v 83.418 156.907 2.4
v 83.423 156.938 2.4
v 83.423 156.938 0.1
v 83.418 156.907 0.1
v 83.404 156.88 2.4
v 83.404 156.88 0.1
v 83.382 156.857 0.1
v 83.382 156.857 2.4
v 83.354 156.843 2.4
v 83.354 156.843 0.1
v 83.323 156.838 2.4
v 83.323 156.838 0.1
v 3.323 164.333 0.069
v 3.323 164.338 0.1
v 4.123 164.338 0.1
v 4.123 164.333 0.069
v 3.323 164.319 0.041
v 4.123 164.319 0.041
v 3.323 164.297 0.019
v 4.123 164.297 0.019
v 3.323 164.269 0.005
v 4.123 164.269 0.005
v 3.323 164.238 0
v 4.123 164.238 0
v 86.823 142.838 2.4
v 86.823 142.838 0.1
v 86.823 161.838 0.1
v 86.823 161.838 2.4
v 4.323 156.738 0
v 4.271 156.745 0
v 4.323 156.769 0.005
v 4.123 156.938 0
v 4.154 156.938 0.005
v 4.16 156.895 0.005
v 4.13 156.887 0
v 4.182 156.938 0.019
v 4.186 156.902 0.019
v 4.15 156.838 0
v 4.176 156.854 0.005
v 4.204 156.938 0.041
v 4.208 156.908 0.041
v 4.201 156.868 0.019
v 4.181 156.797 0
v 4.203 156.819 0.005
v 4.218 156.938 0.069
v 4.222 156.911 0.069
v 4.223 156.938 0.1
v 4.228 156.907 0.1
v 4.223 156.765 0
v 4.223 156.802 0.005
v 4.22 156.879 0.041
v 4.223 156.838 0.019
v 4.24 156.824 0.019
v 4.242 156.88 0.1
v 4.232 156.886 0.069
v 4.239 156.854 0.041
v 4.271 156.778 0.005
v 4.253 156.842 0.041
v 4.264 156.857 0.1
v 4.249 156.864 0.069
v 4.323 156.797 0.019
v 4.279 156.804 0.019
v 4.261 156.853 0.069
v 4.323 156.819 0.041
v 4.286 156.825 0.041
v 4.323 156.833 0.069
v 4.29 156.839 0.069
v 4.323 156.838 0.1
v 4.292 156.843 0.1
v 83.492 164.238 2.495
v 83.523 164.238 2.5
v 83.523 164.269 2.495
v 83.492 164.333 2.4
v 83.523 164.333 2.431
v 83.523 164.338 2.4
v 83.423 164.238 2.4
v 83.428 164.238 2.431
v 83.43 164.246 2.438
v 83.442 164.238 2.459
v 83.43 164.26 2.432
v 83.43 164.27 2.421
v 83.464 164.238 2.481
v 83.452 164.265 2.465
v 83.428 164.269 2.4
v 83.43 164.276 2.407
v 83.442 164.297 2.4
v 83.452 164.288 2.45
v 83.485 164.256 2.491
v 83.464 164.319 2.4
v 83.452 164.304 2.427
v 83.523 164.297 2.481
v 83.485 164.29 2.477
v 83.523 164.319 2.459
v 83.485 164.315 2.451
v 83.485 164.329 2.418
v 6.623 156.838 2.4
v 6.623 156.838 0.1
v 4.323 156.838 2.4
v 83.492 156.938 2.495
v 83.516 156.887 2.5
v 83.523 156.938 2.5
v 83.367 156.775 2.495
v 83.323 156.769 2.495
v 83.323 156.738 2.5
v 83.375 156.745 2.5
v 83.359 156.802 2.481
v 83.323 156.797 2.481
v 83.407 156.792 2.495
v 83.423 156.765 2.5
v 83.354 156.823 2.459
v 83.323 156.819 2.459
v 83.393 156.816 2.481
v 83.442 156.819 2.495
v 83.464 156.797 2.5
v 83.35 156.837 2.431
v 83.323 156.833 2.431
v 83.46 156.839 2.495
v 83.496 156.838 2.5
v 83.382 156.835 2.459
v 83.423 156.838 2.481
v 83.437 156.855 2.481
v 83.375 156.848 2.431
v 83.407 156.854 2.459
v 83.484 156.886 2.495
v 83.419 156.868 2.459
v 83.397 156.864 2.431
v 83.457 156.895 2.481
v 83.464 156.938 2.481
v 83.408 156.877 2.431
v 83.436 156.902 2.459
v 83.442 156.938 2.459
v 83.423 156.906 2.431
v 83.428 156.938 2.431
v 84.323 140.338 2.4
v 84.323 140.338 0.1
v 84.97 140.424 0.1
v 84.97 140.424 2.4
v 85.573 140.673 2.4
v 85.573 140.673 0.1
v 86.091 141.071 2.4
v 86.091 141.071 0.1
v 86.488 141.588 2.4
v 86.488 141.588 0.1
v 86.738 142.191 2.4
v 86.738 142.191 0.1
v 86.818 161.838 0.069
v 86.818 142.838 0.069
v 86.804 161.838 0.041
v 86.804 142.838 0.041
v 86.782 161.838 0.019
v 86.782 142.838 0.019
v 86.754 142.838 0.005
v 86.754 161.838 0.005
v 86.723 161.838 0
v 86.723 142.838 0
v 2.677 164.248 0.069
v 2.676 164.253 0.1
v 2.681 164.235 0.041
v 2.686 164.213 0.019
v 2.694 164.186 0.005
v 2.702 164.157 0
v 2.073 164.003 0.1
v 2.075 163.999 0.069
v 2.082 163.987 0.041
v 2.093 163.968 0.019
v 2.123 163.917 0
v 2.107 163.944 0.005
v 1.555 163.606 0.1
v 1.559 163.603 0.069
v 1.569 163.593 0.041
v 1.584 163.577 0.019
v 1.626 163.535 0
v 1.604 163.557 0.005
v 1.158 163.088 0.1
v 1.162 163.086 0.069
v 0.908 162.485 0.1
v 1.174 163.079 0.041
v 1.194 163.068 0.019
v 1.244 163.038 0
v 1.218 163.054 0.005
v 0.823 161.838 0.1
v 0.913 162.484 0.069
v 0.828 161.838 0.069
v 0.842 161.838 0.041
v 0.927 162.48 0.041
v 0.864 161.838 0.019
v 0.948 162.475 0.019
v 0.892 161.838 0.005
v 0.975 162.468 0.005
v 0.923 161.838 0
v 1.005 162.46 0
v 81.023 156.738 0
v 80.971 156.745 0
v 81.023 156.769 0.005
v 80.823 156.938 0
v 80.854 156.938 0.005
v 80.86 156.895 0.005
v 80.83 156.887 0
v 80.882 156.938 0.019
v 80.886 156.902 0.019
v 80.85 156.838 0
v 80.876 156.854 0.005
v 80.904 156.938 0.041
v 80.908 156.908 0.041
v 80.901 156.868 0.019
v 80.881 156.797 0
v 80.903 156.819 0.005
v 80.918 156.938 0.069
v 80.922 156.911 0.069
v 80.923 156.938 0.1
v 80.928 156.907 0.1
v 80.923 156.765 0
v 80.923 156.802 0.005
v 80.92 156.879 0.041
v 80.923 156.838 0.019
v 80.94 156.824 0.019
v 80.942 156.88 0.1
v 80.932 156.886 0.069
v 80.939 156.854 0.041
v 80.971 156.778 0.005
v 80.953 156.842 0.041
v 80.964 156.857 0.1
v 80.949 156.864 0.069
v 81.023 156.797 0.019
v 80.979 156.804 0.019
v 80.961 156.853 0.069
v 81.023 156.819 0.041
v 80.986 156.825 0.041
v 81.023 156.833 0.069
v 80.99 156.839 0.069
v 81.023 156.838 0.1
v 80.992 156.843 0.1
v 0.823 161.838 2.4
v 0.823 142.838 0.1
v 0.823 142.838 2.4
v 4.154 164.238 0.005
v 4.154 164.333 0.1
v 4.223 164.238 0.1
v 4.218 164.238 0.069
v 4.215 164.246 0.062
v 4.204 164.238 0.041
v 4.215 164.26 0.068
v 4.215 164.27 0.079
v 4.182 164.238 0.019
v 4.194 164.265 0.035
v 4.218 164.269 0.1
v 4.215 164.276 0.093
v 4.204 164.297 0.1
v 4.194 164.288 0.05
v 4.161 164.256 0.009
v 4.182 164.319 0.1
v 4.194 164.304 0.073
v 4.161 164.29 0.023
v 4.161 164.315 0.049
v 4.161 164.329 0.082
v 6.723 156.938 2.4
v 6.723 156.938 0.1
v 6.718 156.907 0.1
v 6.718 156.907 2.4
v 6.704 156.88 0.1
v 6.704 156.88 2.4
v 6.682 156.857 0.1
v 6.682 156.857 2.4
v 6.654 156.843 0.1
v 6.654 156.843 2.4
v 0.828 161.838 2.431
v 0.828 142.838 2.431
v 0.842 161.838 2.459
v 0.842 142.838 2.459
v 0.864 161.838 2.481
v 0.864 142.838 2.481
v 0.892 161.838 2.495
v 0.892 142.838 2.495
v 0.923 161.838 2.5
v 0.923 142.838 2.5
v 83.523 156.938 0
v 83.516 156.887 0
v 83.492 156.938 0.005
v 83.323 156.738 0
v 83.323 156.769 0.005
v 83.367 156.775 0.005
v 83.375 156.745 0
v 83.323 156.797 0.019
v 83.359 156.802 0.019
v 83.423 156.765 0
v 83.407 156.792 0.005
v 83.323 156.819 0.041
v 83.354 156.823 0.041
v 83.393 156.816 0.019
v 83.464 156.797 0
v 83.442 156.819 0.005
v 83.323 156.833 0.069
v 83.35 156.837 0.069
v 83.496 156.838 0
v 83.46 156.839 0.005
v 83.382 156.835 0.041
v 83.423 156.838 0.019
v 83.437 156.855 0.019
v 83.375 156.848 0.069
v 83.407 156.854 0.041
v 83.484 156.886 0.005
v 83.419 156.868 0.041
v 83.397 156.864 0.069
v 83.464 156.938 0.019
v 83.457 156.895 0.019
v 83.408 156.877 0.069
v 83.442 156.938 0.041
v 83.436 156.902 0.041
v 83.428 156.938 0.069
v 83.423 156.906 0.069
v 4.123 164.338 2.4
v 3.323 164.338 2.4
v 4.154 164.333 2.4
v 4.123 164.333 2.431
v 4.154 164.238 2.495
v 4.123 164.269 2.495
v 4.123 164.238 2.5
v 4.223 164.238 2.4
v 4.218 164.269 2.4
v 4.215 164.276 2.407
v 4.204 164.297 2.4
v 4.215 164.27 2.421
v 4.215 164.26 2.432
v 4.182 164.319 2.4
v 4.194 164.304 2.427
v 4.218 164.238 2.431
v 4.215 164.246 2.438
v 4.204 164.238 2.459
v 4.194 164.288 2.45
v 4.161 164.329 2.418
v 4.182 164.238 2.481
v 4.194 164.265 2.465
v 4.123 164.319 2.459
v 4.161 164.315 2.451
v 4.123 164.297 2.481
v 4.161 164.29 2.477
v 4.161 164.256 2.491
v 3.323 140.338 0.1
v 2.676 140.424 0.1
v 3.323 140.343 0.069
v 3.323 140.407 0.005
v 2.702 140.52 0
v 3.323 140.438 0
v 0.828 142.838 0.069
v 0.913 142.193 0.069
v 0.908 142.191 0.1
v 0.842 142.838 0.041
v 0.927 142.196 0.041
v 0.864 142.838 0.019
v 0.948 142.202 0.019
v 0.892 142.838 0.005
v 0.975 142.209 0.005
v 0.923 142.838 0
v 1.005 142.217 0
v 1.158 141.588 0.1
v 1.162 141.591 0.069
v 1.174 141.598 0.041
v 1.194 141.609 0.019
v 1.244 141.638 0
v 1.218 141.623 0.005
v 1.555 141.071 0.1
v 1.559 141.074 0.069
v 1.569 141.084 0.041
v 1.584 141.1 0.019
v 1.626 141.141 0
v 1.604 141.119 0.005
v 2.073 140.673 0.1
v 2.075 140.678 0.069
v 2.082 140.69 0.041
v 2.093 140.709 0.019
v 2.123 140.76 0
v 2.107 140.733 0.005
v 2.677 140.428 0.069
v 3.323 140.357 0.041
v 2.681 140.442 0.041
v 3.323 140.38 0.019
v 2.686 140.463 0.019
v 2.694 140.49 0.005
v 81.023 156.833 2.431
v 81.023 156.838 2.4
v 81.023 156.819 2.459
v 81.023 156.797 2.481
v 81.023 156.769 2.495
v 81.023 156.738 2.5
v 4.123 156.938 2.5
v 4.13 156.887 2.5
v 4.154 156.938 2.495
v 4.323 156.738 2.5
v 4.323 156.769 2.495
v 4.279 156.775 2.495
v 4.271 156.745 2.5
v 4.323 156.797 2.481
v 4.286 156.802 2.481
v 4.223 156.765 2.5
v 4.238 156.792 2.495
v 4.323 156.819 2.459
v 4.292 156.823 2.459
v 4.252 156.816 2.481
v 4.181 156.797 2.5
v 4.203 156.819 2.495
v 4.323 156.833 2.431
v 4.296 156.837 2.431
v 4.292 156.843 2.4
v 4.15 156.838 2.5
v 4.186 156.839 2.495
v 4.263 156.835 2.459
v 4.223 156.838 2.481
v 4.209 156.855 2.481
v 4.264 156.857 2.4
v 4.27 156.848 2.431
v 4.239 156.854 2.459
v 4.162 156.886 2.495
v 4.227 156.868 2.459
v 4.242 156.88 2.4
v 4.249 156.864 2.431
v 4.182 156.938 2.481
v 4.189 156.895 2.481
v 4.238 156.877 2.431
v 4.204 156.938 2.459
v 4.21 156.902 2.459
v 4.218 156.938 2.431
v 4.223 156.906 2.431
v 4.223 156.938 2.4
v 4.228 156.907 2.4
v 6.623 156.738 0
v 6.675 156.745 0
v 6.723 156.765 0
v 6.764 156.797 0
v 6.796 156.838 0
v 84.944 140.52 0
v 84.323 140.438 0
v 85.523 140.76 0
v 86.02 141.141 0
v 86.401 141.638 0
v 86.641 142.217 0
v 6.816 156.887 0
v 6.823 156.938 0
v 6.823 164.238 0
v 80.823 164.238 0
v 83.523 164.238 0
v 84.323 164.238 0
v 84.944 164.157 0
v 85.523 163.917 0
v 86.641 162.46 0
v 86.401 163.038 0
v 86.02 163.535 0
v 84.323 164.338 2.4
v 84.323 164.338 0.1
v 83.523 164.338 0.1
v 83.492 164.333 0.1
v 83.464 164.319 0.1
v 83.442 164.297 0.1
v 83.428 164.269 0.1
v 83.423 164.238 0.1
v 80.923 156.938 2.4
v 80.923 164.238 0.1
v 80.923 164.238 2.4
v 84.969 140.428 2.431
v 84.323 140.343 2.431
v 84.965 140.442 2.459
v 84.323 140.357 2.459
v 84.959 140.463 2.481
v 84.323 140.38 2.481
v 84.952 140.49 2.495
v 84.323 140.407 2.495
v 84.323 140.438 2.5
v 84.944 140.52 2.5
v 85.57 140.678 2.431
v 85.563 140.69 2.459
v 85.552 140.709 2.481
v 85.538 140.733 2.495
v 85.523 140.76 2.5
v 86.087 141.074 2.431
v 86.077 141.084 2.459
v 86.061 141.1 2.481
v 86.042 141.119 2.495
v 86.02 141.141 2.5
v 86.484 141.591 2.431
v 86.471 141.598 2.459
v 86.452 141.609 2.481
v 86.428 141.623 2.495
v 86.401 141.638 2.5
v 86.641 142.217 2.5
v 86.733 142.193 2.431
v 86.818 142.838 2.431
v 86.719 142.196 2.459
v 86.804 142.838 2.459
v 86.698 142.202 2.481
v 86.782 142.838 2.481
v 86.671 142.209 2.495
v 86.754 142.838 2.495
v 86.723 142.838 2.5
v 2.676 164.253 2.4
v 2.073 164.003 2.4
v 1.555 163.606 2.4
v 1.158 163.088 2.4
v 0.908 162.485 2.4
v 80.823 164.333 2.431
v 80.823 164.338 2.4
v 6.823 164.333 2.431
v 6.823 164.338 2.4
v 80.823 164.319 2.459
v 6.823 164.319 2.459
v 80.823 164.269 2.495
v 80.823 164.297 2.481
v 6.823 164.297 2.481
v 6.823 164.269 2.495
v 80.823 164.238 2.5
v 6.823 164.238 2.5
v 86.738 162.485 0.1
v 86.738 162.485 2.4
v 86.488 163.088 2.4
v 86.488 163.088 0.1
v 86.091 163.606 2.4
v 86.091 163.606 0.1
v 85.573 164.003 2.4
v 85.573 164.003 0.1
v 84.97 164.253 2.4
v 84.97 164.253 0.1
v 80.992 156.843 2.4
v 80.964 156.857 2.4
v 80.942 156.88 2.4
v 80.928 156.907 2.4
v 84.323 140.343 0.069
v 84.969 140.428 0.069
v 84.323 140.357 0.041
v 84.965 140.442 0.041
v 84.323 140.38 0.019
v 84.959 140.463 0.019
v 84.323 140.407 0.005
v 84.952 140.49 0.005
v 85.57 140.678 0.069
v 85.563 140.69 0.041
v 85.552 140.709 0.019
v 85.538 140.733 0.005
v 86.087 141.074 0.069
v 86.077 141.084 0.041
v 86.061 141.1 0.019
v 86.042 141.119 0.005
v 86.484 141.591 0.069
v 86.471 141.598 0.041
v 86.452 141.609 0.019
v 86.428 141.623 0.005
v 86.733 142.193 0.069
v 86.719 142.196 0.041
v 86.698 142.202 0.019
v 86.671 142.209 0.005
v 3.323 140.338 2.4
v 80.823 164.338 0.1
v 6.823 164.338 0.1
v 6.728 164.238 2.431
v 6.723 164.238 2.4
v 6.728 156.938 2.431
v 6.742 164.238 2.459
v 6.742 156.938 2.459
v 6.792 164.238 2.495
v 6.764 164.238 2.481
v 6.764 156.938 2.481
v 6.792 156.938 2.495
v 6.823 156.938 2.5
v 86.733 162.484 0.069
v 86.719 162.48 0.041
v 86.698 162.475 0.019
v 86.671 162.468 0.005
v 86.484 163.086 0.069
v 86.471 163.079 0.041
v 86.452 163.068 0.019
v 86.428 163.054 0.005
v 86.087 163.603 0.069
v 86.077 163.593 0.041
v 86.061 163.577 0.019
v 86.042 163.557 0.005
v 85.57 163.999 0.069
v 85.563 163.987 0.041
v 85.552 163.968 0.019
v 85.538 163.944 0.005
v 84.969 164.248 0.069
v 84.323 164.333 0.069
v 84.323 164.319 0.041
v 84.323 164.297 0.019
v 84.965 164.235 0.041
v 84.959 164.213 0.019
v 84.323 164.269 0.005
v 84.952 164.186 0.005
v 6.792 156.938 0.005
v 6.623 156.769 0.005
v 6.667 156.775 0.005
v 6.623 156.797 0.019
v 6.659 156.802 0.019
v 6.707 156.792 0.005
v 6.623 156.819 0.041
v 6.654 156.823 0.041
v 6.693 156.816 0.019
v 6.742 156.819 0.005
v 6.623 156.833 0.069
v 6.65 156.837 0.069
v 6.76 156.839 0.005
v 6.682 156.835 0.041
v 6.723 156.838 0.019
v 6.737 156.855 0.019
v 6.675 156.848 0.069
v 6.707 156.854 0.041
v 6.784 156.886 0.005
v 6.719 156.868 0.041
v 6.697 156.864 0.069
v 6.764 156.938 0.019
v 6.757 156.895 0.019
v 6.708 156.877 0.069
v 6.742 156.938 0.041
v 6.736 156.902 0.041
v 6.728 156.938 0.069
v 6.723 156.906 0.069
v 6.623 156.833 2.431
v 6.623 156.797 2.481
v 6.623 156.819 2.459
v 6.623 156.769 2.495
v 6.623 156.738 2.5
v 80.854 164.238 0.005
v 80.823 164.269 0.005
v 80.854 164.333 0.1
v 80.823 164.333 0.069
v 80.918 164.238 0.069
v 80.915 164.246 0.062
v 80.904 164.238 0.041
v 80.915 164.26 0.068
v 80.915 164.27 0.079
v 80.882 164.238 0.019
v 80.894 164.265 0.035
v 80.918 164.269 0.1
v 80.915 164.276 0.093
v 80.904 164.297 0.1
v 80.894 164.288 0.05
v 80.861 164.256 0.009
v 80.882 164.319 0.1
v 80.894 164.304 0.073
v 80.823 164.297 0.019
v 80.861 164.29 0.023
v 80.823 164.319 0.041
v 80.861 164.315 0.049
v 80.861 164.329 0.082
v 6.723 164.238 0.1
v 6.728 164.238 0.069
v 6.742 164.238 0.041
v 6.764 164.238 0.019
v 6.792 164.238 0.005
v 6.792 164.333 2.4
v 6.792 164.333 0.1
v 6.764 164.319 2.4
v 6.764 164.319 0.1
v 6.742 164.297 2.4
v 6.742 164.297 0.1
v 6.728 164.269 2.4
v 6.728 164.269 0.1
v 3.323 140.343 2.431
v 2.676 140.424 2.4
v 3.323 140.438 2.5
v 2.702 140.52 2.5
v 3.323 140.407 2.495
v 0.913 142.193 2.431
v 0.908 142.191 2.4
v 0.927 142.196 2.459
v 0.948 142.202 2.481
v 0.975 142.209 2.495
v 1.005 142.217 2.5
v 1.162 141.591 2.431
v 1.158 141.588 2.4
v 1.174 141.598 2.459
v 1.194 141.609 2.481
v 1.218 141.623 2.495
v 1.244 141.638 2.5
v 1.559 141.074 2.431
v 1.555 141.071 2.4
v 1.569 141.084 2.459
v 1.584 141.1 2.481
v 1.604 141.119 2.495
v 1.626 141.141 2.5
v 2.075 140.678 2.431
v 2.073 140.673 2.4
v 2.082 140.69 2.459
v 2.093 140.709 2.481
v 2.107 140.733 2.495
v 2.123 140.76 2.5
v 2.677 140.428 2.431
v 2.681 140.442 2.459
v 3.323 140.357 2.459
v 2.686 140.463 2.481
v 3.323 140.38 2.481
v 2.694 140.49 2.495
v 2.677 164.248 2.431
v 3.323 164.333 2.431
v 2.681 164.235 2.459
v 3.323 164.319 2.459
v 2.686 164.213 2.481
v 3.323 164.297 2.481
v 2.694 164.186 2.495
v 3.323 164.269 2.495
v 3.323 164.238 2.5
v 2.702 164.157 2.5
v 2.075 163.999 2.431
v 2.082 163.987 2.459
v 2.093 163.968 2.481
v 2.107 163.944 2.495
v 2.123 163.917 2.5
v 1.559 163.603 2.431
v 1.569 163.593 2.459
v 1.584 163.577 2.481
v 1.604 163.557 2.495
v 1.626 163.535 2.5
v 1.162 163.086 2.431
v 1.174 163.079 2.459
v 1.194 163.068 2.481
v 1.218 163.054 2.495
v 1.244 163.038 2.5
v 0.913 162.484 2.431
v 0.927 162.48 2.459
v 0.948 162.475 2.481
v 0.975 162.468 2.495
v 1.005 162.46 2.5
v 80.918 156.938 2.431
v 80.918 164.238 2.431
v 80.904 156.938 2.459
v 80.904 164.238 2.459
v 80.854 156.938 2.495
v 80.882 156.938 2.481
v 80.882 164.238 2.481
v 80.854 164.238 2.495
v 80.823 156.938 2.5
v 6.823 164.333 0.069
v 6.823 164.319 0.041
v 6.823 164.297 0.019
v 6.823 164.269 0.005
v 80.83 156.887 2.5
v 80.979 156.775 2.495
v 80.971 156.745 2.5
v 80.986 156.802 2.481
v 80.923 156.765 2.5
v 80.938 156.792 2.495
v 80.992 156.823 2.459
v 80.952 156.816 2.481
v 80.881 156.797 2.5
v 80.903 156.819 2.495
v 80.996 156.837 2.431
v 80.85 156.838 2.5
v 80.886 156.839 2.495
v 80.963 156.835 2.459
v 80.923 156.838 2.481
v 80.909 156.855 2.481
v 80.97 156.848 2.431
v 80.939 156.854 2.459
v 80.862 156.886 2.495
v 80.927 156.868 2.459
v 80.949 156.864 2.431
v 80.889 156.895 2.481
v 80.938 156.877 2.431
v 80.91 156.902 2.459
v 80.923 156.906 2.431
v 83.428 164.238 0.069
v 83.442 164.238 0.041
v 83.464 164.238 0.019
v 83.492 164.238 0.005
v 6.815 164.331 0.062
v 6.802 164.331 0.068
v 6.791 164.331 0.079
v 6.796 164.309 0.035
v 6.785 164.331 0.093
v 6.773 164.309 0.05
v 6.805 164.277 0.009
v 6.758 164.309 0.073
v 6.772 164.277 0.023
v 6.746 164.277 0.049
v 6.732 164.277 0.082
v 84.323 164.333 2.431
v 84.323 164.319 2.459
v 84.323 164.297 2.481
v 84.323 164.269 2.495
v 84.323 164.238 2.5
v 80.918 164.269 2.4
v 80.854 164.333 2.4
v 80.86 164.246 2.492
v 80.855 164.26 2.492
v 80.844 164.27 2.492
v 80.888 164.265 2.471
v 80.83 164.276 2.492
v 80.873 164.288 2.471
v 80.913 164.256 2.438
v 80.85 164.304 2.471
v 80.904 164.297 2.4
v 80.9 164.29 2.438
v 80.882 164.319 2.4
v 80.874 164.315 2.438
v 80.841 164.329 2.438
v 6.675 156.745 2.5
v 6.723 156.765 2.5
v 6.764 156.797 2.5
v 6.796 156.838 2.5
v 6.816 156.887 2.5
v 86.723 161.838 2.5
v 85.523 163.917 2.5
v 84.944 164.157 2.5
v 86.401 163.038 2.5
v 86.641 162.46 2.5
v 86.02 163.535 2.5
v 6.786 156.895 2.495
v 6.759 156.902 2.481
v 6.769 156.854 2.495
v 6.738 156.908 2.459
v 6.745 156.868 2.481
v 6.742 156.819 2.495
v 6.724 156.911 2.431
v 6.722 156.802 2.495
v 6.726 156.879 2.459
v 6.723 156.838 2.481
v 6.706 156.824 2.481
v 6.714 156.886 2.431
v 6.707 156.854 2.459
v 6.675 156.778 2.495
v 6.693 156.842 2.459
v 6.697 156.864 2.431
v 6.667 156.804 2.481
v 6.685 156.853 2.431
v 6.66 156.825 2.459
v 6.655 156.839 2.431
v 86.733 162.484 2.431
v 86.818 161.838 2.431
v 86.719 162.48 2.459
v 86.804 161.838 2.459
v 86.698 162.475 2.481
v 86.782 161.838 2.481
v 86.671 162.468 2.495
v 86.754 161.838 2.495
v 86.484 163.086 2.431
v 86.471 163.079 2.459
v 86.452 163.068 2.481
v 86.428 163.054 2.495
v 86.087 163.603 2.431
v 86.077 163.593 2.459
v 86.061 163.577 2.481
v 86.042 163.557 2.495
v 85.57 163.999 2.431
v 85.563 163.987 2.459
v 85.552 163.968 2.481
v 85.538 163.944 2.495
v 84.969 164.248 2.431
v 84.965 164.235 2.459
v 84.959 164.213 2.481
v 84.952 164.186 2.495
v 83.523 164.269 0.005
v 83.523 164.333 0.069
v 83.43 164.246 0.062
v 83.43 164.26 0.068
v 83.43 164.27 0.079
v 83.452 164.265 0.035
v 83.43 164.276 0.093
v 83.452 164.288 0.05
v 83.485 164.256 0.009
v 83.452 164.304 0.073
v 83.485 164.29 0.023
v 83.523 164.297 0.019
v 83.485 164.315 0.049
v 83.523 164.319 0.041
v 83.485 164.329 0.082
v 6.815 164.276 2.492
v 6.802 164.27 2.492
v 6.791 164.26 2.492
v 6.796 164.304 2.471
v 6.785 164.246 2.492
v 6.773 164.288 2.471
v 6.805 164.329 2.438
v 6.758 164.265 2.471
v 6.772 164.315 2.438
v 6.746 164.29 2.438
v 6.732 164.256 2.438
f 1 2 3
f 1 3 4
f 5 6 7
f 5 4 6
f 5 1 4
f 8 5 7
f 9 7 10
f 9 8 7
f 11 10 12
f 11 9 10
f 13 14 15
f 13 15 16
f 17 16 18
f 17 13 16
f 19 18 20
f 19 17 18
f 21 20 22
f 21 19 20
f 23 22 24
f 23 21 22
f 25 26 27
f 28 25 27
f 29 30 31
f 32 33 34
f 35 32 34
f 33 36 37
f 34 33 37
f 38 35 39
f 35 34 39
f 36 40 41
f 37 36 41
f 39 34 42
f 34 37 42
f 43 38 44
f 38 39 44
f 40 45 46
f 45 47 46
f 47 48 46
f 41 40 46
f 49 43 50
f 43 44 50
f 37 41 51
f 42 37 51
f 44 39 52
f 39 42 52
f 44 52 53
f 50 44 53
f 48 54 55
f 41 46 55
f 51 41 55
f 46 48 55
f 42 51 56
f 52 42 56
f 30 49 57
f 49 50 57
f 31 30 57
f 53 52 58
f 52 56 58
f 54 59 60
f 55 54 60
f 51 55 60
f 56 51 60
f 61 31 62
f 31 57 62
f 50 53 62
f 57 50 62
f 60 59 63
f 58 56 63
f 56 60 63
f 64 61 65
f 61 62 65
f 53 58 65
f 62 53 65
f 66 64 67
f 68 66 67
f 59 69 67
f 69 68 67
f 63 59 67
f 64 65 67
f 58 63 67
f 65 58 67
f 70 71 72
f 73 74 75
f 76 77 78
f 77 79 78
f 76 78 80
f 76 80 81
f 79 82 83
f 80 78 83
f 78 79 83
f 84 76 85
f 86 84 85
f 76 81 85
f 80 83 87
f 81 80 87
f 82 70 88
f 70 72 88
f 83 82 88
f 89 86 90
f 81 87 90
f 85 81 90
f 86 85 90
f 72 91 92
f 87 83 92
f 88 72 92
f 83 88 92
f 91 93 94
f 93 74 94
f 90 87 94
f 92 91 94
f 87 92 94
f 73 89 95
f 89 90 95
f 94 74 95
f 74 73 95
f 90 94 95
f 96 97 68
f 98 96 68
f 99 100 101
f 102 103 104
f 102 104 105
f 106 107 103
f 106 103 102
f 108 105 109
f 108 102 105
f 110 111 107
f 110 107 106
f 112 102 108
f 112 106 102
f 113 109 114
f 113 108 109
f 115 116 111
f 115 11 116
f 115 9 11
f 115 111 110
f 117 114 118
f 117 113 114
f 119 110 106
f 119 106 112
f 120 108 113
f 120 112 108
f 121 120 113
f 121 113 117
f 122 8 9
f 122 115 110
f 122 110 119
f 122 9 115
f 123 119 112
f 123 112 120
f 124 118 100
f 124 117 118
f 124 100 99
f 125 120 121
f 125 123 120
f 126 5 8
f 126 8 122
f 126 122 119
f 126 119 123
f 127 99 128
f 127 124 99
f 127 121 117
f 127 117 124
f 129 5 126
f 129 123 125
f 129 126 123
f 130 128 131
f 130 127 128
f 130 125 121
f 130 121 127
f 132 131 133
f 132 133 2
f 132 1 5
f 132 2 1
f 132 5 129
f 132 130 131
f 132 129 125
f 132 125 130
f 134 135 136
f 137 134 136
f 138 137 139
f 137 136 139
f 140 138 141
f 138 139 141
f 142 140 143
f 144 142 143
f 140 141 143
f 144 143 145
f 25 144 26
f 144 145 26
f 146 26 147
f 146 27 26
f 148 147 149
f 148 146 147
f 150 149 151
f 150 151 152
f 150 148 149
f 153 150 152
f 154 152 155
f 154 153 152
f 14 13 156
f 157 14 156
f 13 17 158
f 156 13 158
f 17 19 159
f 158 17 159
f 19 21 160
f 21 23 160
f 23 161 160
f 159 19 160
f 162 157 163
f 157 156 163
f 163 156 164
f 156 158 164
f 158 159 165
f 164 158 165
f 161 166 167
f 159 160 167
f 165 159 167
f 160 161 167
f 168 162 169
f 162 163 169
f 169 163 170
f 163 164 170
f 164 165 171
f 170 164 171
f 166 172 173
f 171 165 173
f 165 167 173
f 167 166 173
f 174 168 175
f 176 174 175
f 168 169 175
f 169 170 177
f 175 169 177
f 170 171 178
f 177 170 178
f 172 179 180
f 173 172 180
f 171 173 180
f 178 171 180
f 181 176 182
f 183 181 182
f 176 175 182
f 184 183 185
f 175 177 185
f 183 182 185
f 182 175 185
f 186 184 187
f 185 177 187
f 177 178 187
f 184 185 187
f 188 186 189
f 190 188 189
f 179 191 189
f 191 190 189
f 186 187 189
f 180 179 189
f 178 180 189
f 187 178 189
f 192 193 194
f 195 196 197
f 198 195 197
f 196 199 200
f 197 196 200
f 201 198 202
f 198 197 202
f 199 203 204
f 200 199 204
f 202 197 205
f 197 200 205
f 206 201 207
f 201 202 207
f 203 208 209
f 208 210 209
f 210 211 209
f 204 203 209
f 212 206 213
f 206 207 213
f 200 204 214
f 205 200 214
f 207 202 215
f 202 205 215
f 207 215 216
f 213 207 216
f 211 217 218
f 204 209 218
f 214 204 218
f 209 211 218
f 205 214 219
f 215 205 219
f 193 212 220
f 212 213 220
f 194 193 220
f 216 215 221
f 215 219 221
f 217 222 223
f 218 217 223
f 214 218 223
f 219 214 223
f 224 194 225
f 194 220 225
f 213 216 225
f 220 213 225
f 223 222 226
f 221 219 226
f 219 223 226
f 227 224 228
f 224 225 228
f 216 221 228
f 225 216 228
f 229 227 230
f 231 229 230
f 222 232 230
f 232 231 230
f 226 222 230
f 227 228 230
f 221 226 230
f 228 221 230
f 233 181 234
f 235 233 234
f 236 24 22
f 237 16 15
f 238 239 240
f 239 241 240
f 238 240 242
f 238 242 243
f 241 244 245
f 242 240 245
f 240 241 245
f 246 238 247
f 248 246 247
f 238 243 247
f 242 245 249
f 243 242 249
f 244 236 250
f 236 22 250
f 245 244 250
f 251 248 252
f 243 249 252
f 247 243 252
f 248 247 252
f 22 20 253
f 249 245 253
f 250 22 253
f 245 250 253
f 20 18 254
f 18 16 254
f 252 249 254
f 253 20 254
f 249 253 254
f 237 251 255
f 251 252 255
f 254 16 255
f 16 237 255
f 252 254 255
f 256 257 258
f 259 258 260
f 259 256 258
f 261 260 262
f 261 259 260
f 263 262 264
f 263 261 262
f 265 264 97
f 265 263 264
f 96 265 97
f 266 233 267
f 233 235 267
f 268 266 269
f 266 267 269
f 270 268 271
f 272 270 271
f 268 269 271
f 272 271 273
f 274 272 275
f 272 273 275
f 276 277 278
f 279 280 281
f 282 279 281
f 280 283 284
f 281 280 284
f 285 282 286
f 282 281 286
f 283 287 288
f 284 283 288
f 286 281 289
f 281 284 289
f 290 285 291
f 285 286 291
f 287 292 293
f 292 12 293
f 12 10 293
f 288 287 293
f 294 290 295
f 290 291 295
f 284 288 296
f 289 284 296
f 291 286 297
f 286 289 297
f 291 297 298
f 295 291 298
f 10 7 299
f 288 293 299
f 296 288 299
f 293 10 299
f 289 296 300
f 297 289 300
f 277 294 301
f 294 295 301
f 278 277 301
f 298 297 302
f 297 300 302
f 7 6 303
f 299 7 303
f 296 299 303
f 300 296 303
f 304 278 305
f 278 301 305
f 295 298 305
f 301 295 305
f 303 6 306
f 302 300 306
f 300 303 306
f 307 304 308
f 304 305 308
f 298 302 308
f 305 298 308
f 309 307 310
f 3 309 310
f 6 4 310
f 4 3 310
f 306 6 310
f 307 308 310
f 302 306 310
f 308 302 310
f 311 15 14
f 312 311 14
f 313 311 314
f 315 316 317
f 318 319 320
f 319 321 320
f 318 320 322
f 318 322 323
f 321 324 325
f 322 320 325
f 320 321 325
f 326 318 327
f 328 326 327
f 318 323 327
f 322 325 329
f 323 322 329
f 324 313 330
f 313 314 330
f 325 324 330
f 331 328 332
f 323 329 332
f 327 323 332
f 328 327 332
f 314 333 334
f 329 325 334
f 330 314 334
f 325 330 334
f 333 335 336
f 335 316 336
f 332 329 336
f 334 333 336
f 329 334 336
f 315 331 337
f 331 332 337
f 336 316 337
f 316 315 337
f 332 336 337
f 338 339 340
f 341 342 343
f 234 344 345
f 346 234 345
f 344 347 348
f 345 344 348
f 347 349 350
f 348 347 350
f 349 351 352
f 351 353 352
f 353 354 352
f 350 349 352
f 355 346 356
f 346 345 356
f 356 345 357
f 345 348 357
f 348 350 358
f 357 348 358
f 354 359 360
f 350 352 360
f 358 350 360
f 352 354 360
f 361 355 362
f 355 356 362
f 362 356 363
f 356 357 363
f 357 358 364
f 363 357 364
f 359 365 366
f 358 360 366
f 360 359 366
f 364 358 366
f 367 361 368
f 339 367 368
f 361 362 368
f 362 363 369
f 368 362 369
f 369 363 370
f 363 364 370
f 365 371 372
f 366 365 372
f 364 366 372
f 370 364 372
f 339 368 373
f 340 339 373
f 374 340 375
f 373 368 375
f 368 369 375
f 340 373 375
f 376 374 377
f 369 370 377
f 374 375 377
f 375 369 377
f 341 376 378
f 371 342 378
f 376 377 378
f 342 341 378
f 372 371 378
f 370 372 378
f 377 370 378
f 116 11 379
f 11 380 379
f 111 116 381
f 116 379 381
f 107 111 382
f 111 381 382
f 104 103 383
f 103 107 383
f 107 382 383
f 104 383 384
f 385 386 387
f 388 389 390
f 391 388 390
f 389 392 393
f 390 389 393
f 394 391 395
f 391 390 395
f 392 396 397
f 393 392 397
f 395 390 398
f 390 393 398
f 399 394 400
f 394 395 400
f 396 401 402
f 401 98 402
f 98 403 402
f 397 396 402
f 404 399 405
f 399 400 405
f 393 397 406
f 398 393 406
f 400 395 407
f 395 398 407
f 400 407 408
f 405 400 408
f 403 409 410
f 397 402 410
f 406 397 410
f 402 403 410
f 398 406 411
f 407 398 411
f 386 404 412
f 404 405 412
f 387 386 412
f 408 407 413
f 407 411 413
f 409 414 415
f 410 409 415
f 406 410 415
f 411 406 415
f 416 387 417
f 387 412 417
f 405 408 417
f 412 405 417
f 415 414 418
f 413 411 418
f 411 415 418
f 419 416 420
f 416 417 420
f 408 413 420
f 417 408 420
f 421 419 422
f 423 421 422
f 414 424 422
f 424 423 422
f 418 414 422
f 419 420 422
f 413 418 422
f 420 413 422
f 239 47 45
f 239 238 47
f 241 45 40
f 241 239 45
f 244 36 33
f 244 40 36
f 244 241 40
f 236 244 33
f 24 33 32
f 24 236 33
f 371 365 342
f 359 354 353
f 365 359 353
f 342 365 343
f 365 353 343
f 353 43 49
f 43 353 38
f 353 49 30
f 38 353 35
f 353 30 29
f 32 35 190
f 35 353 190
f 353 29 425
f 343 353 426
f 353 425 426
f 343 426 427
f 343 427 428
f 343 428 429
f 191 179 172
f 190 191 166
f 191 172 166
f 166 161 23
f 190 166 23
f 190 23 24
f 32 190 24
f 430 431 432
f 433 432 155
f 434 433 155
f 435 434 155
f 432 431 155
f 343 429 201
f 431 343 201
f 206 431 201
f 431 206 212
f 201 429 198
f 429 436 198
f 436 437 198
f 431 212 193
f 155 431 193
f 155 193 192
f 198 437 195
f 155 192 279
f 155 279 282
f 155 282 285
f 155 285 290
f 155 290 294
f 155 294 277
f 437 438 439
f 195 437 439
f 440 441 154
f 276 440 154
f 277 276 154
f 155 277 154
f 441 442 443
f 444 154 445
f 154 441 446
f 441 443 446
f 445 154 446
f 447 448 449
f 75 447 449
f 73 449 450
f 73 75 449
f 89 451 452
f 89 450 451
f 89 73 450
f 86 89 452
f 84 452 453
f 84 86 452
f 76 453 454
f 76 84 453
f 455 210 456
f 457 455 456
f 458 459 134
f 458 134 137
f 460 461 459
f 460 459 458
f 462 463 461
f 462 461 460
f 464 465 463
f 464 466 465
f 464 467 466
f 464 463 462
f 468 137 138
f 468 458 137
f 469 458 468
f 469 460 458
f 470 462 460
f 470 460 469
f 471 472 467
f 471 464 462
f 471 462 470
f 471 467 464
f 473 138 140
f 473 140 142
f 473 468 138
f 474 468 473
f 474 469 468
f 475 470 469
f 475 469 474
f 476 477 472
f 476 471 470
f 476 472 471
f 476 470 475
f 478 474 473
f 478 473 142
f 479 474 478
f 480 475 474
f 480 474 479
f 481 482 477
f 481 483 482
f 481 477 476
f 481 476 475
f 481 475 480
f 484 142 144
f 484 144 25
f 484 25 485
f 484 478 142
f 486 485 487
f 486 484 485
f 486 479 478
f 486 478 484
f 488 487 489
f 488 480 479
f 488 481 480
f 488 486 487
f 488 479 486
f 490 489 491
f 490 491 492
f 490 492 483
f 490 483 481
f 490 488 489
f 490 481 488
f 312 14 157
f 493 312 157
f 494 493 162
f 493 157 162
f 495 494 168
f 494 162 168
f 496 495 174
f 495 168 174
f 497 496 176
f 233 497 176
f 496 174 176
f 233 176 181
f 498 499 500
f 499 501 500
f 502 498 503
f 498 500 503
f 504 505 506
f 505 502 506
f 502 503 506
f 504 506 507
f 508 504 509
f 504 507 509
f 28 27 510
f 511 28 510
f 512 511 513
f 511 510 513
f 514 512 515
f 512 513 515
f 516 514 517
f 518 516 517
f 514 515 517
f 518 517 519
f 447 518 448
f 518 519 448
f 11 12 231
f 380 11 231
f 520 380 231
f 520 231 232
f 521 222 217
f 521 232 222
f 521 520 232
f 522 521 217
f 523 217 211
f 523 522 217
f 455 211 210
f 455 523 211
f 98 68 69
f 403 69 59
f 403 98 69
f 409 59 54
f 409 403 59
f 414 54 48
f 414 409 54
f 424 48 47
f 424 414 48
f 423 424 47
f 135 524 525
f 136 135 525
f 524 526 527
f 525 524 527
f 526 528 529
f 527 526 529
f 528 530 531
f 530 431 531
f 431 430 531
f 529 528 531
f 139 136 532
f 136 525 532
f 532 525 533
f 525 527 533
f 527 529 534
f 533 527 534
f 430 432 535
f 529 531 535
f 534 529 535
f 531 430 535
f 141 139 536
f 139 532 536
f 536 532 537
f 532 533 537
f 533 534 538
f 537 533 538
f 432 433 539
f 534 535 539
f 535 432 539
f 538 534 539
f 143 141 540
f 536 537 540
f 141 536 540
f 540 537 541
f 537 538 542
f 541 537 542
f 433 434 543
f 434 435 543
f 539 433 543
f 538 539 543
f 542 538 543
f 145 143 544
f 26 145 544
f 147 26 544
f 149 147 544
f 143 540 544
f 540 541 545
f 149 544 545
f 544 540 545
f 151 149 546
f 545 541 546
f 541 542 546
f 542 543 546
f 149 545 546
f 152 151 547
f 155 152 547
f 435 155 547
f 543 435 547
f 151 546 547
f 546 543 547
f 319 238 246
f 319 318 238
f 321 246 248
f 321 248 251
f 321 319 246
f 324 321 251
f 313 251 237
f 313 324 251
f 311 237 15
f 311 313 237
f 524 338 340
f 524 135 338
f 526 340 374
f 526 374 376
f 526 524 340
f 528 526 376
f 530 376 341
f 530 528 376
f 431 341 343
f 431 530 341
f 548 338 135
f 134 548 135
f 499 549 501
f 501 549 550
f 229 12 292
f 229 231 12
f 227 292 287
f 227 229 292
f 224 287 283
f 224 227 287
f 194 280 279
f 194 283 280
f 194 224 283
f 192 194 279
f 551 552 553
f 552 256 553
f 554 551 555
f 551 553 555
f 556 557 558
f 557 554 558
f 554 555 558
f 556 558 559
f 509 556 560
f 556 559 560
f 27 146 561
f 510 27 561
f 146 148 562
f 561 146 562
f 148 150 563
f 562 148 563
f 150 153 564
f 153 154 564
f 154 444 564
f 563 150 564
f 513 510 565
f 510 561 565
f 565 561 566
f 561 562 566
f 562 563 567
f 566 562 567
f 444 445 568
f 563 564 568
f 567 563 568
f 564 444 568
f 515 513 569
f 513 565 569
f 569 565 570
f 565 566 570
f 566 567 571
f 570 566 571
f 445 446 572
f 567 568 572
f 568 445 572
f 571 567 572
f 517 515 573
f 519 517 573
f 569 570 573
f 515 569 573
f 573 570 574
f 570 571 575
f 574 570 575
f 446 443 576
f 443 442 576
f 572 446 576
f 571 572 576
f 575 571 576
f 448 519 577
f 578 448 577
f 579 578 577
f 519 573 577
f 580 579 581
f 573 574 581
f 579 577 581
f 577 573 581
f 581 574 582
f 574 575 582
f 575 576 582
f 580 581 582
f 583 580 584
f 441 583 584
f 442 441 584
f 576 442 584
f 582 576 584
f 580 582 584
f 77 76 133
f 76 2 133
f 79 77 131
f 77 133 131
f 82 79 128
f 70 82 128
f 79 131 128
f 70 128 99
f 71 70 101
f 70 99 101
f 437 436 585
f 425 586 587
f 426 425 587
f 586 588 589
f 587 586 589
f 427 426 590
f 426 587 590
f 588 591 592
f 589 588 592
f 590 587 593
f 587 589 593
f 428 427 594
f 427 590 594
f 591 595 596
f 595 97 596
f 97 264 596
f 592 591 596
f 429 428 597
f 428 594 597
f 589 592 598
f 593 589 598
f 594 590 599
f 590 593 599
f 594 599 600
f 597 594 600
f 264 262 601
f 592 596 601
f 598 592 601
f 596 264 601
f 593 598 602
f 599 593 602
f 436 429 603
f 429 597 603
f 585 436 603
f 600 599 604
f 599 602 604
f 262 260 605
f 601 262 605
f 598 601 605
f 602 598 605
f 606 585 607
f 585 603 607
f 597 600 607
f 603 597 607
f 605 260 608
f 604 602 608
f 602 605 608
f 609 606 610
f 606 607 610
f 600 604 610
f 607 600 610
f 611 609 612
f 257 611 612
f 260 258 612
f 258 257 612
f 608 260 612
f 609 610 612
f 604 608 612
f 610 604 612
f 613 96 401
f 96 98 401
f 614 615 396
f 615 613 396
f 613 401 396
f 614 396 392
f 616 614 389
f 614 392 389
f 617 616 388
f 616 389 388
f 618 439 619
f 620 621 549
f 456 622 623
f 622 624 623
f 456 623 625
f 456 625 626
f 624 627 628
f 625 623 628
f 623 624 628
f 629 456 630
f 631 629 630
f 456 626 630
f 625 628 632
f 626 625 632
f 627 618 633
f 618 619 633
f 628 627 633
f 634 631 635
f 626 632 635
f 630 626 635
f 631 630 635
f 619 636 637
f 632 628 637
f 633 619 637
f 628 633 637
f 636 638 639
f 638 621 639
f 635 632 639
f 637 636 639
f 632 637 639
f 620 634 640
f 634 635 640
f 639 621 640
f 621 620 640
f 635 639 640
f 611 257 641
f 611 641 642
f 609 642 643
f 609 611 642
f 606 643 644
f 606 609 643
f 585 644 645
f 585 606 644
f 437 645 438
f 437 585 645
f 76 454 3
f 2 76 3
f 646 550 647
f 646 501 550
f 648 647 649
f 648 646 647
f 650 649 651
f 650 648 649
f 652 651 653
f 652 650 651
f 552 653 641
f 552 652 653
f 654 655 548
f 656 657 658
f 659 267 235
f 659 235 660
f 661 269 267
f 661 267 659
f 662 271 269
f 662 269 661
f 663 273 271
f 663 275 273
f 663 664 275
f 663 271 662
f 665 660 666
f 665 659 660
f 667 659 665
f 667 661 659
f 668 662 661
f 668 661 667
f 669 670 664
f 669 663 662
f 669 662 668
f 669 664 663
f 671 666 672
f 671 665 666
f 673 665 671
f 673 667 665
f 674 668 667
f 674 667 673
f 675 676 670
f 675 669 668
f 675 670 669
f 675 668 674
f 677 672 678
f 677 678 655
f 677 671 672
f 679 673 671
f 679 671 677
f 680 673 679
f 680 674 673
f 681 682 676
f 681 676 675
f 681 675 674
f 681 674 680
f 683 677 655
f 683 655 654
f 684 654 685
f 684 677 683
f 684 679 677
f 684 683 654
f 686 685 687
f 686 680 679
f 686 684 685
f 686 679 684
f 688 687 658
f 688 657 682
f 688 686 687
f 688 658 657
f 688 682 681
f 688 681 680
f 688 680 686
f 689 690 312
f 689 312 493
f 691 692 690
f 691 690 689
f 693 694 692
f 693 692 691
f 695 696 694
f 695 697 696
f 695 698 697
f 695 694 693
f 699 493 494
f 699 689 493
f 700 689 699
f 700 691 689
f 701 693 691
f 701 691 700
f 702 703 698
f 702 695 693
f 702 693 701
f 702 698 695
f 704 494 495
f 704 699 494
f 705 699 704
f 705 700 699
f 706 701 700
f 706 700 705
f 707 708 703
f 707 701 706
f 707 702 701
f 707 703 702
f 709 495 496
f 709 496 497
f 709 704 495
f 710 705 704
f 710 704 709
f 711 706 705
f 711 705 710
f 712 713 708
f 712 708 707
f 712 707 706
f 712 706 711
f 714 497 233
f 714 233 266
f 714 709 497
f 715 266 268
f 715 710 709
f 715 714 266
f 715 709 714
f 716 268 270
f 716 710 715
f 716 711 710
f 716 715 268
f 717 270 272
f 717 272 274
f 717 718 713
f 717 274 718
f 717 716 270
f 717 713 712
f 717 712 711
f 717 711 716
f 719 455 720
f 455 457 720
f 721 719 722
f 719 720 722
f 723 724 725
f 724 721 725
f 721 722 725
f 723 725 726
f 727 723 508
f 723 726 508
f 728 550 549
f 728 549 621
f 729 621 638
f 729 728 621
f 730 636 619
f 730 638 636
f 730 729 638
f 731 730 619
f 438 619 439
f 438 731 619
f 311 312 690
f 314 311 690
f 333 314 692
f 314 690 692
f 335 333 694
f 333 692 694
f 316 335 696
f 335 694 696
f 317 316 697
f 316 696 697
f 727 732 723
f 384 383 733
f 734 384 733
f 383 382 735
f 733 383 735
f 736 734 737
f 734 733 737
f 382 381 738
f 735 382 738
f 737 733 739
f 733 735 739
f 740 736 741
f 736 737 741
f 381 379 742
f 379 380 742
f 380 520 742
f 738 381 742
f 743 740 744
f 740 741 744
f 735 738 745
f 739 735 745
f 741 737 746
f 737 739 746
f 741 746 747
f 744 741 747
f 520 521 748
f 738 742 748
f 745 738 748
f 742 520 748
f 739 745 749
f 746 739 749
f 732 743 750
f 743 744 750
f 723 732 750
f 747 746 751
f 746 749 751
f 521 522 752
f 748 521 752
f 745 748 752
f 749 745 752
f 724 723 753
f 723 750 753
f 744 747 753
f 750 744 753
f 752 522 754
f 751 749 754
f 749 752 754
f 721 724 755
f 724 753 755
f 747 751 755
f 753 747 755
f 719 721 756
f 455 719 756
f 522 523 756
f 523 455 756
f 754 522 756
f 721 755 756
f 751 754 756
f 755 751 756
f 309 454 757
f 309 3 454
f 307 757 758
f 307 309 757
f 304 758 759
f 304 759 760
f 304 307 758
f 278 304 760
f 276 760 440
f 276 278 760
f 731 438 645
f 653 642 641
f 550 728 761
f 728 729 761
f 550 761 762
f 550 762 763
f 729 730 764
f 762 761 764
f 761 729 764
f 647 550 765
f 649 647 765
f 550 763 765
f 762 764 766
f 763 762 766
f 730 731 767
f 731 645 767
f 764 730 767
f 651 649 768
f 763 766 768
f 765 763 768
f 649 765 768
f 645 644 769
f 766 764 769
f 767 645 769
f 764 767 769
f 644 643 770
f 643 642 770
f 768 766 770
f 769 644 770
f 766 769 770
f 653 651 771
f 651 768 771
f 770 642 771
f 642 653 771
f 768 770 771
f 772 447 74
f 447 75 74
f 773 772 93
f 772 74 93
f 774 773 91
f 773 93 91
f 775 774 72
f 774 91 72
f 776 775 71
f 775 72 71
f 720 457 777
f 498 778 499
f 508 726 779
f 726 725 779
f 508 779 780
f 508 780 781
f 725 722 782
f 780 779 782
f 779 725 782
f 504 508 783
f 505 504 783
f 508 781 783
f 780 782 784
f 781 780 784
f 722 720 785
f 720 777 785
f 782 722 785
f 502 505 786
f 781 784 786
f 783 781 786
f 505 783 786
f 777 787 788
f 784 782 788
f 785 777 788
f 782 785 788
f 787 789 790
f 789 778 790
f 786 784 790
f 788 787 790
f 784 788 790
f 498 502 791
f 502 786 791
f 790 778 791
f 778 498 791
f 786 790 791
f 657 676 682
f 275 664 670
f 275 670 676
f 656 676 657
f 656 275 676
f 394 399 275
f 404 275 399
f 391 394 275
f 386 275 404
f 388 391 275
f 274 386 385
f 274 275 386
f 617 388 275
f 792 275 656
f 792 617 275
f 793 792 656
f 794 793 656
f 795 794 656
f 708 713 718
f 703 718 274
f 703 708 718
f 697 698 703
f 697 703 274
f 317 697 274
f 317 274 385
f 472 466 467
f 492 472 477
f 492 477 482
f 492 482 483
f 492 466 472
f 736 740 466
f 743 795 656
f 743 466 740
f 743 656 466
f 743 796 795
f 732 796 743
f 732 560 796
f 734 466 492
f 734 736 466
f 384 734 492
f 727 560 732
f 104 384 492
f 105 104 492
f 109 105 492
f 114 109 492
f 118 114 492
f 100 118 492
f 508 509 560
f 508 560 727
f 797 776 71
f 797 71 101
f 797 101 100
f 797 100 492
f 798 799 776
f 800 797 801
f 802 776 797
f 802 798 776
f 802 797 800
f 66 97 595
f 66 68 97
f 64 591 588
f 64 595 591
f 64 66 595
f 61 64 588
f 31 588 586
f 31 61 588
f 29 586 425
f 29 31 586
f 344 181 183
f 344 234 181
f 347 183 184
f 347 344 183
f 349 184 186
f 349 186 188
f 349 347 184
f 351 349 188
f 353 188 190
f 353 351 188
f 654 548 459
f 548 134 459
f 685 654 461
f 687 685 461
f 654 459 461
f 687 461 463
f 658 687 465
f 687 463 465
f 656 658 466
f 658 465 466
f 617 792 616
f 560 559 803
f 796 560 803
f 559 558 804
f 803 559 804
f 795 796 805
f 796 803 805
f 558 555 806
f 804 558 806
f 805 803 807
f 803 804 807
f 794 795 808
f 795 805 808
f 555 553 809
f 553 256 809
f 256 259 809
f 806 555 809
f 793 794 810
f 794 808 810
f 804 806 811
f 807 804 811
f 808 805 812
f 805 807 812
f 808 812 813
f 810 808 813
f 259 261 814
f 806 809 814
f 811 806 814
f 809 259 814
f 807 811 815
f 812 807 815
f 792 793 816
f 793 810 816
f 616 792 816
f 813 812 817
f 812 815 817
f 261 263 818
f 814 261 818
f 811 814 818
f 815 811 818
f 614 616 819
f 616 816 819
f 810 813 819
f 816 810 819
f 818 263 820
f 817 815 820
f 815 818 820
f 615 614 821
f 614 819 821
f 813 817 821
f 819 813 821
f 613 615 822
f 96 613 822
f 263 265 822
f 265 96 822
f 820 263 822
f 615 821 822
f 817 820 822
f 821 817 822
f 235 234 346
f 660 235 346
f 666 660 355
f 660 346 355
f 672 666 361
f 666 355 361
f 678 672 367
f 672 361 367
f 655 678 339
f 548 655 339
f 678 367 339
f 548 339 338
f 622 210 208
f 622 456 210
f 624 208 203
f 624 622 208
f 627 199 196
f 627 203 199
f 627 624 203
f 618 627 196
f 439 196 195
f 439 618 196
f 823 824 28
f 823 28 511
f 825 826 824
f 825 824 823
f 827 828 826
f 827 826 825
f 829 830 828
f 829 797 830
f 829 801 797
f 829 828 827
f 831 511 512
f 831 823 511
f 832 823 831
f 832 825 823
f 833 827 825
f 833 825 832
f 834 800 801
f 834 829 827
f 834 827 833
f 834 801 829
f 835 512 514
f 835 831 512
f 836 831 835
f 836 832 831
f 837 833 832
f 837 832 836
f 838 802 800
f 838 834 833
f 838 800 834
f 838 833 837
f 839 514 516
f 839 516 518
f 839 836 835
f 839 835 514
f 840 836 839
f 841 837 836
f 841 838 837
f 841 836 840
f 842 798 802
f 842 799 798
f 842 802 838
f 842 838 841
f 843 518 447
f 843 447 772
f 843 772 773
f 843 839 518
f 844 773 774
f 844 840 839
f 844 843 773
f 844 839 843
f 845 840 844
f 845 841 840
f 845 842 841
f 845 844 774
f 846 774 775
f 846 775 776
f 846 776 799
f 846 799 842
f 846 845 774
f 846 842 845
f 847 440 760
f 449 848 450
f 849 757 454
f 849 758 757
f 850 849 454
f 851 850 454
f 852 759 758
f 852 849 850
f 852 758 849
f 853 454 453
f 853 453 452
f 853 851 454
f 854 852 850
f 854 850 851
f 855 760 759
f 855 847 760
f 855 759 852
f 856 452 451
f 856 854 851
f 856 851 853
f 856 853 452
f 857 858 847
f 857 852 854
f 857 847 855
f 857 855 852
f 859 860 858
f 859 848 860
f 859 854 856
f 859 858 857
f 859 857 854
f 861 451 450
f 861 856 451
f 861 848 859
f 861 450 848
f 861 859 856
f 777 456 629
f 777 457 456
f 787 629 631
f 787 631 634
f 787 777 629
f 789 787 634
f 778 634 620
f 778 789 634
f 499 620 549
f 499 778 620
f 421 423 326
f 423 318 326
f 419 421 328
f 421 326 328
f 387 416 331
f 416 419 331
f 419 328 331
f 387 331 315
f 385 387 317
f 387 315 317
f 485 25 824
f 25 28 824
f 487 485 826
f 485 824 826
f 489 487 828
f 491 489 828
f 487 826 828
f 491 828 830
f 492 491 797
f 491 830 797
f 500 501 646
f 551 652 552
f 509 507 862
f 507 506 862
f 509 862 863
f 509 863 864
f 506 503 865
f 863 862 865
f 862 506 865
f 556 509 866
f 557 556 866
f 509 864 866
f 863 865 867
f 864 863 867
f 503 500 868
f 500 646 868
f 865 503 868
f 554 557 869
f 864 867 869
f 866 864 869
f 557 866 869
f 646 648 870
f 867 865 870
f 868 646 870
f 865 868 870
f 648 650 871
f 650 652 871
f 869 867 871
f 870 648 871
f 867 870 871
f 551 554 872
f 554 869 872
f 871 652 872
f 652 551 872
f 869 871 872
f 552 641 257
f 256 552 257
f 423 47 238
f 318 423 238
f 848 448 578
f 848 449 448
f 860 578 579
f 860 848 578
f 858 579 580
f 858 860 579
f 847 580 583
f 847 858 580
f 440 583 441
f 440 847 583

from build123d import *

# Parameters (mm, degrees)
RESSALTO_EXTRUS_O1_DEPTH = 2.5
FILETE1_R                = 0.1


with BuildPart() as part:
    # Esboço1 → Ressalto-extrusão1 (new body)
    with BuildSketch(Plane.XY):
        with BuildLine():
            ThreePointArc((0.822871292, 142.838341472), (1.555104339, 141.070574519), (3.322871292, 140.338341472))
            Line((3.322871292, 140.338341472), (84.322871292, 140.338341472))
            ThreePointArc((84.322871292, 140.338341472), (86.090638245, 141.070574519), (86.822871292, 142.838341472))
            Line((86.822871292, 142.838341472), (86.822871292, 161.838341472))
            ThreePointArc((86.822871292, 161.838341472), (86.090638245, 163.606108425), (84.322871292, 164.338341472))
            Line((84.322871292, 164.338341472), (83.422871292, 164.338341472))
            Line((83.422871292, 164.338341472), (83.422871292, 156.838341472))
            Line((83.422871292, 156.838341472), (80.922871292, 156.838341472))
            Line((80.922871292, 156.838341472), (80.922871292, 164.338341472))
            Line((80.922871292, 164.338341472), (6.722871292, 164.338341472))
            Line((6.722871292, 164.338341472), (6.722871292, 156.838341472))
            Line((6.722871292, 156.838341472), (4.222871292, 156.838341472))
            Line((4.222871292, 156.838341472), (4.222871292, 164.338341472))
            Line((4.222871292, 164.338341472), (3.322871292, 164.338341472))
            ThreePointArc((3.322871292, 164.338341472), (1.555104339, 163.606108425), (0.822871292, 161.838341472))
            Line((0.822871292, 161.838341472), (0.822871292, 142.838341472))
        make_face()
    extrude(amount=RESSALTO_EXTRUS_O1_DEPTH)

    # Filete1
    filete1_edges = [part.edges().sort_by_distance(p)[0] for p in [
        (86.090638245, 141.070574519, 2.5),
        (0.822871292, 152.338341472, 0),
        (1.555104339, 163.606108425, 0),
        (3.772871292, 164.338341472, 0),
        (86.822871292, 152.338341472, 2.5),
        (4.222871292, 160.588341472, 0),
        (5.472871292, 156.838341472, 0),
        (6.722871292, 160.588341472, 0),
        (43.822871292, 164.338341472, 0),
        (80.922871292, 160.588341472, 0),
        (82.172871292, 156.838341472, 0),
        (83.422871292, 160.588341472, 0),
        (83.872871292, 164.338341472, 0),
        (86.090638245, 163.606108425, 2.5),
        (86.090638245, 163.606108425, 0),
        (86.822871292, 152.338341472, 0),
        (86.090638245, 141.070574519, 0),
        (43.822871292, 140.338341472, 0),
        (1.555104339, 141.070574519, 0),
        (83.872871292, 164.338341472, 2.5),
        (4.222871292, 164.338341472, 1.25),
        (4.222871292, 156.838341472, 1.25),
        (83.422871292, 160.588341472, 2.5),
        (6.722871292, 156.838341472, 1.25),
        (6.722871292, 164.338341472, 1.25),
        (80.922871292, 164.338341472, 1.25),
        (80.922871292, 156.838341472, 1.25),
        (83.422871292, 156.838341472, 1.25),
        (83.422871292, 164.338341472, 1.25),
        (82.172871292, 156.838341472, 2.5),
        (80.922871292, 160.588341472, 2.5),
        (43.822871292, 164.338341472, 2.5),
        (6.722871292, 160.588341472, 2.5),
        (5.472871292, 156.838341472, 2.5),
        (1.555104339, 141.070574519, 2.5),
        (4.222871292, 160.588341472, 2.5),
        (3.772871292, 164.338341472, 2.5),
        (1.555104339, 163.606108425, 2.5),
        (0.822871292, 152.338341472, 2.5),
        (43.822871292, 140.338341472, 2.5),
    ]]
    fillet(filete1_edges, radius=FILETE1_R)


solid = part.part
